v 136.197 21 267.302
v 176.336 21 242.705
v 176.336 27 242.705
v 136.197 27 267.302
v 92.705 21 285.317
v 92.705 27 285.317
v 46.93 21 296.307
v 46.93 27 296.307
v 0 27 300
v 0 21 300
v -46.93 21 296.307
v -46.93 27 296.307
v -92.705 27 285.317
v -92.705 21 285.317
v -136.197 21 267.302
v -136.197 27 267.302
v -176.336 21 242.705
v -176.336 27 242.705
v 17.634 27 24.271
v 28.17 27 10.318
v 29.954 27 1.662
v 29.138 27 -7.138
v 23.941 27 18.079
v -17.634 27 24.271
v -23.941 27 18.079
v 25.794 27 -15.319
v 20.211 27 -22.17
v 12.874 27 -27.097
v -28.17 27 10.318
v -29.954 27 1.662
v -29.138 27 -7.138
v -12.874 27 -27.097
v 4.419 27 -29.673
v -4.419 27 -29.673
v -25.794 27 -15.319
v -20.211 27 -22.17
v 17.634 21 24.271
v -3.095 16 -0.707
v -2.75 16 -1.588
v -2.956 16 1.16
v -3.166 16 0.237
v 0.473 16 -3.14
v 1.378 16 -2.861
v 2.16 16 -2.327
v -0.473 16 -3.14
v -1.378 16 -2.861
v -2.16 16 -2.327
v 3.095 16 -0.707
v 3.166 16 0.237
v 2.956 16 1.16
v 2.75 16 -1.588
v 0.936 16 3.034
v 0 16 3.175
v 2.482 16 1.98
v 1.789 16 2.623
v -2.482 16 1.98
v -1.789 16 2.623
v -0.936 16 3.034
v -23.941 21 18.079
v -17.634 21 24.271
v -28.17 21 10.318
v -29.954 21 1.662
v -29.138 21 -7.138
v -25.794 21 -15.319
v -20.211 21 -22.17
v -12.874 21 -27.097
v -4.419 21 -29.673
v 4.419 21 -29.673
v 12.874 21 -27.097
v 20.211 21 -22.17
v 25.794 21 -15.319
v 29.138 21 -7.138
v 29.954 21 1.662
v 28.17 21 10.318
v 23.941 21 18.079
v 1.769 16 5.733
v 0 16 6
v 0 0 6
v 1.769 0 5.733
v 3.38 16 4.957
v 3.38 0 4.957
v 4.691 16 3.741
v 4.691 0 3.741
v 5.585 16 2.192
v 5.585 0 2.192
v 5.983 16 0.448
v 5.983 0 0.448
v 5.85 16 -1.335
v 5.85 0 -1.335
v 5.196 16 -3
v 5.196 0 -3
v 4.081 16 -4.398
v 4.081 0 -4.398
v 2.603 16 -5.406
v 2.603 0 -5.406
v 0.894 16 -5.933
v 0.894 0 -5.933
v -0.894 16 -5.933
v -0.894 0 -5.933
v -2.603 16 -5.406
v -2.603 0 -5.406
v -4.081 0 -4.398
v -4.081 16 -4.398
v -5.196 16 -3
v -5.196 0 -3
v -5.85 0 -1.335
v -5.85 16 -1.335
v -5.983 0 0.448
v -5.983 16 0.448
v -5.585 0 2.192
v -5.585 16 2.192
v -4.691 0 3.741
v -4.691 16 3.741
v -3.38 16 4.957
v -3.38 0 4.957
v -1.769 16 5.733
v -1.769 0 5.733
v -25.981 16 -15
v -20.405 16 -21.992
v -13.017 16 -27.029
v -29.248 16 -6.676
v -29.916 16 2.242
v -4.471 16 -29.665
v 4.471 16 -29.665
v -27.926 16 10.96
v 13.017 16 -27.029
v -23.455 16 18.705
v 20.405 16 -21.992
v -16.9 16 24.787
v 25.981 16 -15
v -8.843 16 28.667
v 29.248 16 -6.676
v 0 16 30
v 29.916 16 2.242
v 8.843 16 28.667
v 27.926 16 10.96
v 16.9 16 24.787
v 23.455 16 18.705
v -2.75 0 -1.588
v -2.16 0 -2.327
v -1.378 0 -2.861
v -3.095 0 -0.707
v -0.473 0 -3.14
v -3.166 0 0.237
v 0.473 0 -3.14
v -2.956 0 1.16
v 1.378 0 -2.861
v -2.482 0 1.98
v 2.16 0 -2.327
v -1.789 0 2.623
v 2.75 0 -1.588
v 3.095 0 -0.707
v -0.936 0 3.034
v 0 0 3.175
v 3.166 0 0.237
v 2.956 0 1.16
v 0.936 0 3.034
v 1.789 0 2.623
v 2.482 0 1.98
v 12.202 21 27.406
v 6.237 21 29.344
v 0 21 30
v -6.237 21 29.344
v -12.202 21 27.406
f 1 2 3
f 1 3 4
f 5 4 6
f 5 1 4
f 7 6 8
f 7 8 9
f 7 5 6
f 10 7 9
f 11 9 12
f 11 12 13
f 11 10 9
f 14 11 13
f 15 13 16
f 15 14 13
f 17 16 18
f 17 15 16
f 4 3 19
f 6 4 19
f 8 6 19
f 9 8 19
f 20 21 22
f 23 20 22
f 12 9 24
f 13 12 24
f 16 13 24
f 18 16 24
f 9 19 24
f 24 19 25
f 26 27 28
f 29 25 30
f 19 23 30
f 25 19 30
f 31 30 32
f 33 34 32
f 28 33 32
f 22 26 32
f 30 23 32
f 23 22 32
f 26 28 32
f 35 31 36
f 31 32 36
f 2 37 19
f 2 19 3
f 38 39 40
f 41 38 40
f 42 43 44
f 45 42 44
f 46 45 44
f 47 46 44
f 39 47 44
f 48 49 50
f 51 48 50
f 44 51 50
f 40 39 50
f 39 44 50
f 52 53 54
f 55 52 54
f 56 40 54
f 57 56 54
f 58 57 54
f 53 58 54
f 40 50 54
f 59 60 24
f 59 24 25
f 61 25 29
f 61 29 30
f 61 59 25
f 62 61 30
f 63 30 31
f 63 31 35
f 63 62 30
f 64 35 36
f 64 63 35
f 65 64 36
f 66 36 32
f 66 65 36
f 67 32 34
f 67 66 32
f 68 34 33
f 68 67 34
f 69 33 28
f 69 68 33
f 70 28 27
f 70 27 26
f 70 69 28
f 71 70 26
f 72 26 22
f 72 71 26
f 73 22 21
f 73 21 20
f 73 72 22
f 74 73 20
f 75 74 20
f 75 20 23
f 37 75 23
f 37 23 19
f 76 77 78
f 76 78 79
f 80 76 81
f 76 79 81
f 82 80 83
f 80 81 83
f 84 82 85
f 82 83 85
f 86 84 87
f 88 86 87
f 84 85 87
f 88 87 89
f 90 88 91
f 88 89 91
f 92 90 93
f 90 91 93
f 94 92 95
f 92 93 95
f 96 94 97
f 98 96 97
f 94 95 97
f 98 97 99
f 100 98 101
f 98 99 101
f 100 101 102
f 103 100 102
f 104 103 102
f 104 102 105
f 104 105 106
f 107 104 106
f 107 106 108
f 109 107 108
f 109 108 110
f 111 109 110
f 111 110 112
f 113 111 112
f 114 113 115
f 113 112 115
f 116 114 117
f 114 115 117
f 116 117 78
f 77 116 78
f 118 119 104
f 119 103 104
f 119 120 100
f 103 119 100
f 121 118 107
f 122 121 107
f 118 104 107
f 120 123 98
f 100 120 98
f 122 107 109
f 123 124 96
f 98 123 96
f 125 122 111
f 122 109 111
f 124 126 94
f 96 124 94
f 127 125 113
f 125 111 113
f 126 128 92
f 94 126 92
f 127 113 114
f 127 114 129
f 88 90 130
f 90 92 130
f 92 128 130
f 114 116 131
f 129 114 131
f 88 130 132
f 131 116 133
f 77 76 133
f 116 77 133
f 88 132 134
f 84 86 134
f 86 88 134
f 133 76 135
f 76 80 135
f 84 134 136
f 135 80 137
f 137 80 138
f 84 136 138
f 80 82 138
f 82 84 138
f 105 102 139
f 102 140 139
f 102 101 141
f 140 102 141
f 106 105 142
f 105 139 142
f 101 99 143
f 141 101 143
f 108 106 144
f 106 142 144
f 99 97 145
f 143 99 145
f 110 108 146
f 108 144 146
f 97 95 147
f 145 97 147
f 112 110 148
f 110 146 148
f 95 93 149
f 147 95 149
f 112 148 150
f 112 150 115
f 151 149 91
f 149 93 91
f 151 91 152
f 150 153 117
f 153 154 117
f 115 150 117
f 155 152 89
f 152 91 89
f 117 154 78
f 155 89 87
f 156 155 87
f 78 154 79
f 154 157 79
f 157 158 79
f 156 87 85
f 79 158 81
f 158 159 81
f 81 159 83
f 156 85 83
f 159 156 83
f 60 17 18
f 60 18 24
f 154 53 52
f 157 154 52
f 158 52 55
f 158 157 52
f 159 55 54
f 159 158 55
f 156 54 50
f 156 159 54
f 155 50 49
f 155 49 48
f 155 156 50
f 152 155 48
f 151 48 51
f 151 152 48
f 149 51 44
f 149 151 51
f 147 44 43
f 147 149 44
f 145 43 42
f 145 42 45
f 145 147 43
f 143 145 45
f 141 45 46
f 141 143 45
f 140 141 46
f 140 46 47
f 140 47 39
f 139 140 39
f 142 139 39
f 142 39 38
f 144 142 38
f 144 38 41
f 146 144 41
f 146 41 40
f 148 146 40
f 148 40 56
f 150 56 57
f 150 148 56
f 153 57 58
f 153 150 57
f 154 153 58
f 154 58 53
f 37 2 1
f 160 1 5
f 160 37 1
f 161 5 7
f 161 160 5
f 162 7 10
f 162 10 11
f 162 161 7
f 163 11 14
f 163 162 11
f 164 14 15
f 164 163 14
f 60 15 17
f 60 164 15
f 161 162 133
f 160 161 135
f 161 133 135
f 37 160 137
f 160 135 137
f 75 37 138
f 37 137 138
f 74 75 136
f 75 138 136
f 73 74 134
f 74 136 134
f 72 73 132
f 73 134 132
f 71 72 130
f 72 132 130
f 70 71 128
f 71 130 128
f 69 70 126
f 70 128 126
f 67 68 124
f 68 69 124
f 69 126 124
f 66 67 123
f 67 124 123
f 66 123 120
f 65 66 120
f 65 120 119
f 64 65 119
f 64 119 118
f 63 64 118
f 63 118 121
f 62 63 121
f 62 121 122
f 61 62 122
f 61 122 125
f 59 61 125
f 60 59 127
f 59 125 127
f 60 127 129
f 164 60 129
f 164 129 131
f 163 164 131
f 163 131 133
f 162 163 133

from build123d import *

# Parameters (mm, degrees)
SKETCH1_R           = 6
SKETCH1_R_2         = 3.175
BOSS_EXTRUDE1_DEPTH = 16
SKETCH2_R           = 30
BOSS_EXTRUDE2_DEPTH = 5
BOSS_EXTRUDE3_DEPTH = 6


with BuildPart() as part:
    # Sketch1 → Boss-Extrude1 (new body)
    with BuildSketch(Plane(origin=(0, 0, 0), x_dir=(1, 0, 0), z_dir=(0, 1, 0))):
        with Locations(Location((0, 0, 0), (0, 0, 270))):
            Circle(SKETCH1_R)
        with Locations(Location((0, 0, 0), (0, 0, 270))):
            Circle(SKETCH1_R_2, mode=Mode.SUBTRACT)
    extrude(amount=BOSS_EXTRUDE1_DEPTH)

    # Sketch2 → Boss-Extrude2 (add)
    with BuildSketch(Plane(origin=(0, 16, 0), x_dir=(1, 0, 0), z_dir=(0, 1, 0))):
        with Locations(Location((0, 0, 0), (0, 0, 270))):
            Circle(SKETCH2_R)
    extrude(amount=BOSS_EXTRUDE2_DEPTH)

    # Sketch3 → Boss-Extrude3 (add)
    with BuildSketch(Plane(origin=(0, 21, 0), x_dir=(1, 0, 0), z_dir=(0, 1, 0))):
        with BuildLine():
            Line((17.633557569, -24.270509831), (176.335575688, -242.705098312))
            ThreePointArc((176.335575688, -242.705098312), (0, -300), (-176.335575688, -242.705098312))
            Line((-176.335575688, -242.705098312), (-17.633557569, -24.270509831))
            ThreePointArc((-17.633557569, -24.270509831), (0, 30), (17.633557569, -24.270509831))
        make_face()
    extrude(amount=BOSS_EXTRUDE3_DEPTH)


solid = part.part
